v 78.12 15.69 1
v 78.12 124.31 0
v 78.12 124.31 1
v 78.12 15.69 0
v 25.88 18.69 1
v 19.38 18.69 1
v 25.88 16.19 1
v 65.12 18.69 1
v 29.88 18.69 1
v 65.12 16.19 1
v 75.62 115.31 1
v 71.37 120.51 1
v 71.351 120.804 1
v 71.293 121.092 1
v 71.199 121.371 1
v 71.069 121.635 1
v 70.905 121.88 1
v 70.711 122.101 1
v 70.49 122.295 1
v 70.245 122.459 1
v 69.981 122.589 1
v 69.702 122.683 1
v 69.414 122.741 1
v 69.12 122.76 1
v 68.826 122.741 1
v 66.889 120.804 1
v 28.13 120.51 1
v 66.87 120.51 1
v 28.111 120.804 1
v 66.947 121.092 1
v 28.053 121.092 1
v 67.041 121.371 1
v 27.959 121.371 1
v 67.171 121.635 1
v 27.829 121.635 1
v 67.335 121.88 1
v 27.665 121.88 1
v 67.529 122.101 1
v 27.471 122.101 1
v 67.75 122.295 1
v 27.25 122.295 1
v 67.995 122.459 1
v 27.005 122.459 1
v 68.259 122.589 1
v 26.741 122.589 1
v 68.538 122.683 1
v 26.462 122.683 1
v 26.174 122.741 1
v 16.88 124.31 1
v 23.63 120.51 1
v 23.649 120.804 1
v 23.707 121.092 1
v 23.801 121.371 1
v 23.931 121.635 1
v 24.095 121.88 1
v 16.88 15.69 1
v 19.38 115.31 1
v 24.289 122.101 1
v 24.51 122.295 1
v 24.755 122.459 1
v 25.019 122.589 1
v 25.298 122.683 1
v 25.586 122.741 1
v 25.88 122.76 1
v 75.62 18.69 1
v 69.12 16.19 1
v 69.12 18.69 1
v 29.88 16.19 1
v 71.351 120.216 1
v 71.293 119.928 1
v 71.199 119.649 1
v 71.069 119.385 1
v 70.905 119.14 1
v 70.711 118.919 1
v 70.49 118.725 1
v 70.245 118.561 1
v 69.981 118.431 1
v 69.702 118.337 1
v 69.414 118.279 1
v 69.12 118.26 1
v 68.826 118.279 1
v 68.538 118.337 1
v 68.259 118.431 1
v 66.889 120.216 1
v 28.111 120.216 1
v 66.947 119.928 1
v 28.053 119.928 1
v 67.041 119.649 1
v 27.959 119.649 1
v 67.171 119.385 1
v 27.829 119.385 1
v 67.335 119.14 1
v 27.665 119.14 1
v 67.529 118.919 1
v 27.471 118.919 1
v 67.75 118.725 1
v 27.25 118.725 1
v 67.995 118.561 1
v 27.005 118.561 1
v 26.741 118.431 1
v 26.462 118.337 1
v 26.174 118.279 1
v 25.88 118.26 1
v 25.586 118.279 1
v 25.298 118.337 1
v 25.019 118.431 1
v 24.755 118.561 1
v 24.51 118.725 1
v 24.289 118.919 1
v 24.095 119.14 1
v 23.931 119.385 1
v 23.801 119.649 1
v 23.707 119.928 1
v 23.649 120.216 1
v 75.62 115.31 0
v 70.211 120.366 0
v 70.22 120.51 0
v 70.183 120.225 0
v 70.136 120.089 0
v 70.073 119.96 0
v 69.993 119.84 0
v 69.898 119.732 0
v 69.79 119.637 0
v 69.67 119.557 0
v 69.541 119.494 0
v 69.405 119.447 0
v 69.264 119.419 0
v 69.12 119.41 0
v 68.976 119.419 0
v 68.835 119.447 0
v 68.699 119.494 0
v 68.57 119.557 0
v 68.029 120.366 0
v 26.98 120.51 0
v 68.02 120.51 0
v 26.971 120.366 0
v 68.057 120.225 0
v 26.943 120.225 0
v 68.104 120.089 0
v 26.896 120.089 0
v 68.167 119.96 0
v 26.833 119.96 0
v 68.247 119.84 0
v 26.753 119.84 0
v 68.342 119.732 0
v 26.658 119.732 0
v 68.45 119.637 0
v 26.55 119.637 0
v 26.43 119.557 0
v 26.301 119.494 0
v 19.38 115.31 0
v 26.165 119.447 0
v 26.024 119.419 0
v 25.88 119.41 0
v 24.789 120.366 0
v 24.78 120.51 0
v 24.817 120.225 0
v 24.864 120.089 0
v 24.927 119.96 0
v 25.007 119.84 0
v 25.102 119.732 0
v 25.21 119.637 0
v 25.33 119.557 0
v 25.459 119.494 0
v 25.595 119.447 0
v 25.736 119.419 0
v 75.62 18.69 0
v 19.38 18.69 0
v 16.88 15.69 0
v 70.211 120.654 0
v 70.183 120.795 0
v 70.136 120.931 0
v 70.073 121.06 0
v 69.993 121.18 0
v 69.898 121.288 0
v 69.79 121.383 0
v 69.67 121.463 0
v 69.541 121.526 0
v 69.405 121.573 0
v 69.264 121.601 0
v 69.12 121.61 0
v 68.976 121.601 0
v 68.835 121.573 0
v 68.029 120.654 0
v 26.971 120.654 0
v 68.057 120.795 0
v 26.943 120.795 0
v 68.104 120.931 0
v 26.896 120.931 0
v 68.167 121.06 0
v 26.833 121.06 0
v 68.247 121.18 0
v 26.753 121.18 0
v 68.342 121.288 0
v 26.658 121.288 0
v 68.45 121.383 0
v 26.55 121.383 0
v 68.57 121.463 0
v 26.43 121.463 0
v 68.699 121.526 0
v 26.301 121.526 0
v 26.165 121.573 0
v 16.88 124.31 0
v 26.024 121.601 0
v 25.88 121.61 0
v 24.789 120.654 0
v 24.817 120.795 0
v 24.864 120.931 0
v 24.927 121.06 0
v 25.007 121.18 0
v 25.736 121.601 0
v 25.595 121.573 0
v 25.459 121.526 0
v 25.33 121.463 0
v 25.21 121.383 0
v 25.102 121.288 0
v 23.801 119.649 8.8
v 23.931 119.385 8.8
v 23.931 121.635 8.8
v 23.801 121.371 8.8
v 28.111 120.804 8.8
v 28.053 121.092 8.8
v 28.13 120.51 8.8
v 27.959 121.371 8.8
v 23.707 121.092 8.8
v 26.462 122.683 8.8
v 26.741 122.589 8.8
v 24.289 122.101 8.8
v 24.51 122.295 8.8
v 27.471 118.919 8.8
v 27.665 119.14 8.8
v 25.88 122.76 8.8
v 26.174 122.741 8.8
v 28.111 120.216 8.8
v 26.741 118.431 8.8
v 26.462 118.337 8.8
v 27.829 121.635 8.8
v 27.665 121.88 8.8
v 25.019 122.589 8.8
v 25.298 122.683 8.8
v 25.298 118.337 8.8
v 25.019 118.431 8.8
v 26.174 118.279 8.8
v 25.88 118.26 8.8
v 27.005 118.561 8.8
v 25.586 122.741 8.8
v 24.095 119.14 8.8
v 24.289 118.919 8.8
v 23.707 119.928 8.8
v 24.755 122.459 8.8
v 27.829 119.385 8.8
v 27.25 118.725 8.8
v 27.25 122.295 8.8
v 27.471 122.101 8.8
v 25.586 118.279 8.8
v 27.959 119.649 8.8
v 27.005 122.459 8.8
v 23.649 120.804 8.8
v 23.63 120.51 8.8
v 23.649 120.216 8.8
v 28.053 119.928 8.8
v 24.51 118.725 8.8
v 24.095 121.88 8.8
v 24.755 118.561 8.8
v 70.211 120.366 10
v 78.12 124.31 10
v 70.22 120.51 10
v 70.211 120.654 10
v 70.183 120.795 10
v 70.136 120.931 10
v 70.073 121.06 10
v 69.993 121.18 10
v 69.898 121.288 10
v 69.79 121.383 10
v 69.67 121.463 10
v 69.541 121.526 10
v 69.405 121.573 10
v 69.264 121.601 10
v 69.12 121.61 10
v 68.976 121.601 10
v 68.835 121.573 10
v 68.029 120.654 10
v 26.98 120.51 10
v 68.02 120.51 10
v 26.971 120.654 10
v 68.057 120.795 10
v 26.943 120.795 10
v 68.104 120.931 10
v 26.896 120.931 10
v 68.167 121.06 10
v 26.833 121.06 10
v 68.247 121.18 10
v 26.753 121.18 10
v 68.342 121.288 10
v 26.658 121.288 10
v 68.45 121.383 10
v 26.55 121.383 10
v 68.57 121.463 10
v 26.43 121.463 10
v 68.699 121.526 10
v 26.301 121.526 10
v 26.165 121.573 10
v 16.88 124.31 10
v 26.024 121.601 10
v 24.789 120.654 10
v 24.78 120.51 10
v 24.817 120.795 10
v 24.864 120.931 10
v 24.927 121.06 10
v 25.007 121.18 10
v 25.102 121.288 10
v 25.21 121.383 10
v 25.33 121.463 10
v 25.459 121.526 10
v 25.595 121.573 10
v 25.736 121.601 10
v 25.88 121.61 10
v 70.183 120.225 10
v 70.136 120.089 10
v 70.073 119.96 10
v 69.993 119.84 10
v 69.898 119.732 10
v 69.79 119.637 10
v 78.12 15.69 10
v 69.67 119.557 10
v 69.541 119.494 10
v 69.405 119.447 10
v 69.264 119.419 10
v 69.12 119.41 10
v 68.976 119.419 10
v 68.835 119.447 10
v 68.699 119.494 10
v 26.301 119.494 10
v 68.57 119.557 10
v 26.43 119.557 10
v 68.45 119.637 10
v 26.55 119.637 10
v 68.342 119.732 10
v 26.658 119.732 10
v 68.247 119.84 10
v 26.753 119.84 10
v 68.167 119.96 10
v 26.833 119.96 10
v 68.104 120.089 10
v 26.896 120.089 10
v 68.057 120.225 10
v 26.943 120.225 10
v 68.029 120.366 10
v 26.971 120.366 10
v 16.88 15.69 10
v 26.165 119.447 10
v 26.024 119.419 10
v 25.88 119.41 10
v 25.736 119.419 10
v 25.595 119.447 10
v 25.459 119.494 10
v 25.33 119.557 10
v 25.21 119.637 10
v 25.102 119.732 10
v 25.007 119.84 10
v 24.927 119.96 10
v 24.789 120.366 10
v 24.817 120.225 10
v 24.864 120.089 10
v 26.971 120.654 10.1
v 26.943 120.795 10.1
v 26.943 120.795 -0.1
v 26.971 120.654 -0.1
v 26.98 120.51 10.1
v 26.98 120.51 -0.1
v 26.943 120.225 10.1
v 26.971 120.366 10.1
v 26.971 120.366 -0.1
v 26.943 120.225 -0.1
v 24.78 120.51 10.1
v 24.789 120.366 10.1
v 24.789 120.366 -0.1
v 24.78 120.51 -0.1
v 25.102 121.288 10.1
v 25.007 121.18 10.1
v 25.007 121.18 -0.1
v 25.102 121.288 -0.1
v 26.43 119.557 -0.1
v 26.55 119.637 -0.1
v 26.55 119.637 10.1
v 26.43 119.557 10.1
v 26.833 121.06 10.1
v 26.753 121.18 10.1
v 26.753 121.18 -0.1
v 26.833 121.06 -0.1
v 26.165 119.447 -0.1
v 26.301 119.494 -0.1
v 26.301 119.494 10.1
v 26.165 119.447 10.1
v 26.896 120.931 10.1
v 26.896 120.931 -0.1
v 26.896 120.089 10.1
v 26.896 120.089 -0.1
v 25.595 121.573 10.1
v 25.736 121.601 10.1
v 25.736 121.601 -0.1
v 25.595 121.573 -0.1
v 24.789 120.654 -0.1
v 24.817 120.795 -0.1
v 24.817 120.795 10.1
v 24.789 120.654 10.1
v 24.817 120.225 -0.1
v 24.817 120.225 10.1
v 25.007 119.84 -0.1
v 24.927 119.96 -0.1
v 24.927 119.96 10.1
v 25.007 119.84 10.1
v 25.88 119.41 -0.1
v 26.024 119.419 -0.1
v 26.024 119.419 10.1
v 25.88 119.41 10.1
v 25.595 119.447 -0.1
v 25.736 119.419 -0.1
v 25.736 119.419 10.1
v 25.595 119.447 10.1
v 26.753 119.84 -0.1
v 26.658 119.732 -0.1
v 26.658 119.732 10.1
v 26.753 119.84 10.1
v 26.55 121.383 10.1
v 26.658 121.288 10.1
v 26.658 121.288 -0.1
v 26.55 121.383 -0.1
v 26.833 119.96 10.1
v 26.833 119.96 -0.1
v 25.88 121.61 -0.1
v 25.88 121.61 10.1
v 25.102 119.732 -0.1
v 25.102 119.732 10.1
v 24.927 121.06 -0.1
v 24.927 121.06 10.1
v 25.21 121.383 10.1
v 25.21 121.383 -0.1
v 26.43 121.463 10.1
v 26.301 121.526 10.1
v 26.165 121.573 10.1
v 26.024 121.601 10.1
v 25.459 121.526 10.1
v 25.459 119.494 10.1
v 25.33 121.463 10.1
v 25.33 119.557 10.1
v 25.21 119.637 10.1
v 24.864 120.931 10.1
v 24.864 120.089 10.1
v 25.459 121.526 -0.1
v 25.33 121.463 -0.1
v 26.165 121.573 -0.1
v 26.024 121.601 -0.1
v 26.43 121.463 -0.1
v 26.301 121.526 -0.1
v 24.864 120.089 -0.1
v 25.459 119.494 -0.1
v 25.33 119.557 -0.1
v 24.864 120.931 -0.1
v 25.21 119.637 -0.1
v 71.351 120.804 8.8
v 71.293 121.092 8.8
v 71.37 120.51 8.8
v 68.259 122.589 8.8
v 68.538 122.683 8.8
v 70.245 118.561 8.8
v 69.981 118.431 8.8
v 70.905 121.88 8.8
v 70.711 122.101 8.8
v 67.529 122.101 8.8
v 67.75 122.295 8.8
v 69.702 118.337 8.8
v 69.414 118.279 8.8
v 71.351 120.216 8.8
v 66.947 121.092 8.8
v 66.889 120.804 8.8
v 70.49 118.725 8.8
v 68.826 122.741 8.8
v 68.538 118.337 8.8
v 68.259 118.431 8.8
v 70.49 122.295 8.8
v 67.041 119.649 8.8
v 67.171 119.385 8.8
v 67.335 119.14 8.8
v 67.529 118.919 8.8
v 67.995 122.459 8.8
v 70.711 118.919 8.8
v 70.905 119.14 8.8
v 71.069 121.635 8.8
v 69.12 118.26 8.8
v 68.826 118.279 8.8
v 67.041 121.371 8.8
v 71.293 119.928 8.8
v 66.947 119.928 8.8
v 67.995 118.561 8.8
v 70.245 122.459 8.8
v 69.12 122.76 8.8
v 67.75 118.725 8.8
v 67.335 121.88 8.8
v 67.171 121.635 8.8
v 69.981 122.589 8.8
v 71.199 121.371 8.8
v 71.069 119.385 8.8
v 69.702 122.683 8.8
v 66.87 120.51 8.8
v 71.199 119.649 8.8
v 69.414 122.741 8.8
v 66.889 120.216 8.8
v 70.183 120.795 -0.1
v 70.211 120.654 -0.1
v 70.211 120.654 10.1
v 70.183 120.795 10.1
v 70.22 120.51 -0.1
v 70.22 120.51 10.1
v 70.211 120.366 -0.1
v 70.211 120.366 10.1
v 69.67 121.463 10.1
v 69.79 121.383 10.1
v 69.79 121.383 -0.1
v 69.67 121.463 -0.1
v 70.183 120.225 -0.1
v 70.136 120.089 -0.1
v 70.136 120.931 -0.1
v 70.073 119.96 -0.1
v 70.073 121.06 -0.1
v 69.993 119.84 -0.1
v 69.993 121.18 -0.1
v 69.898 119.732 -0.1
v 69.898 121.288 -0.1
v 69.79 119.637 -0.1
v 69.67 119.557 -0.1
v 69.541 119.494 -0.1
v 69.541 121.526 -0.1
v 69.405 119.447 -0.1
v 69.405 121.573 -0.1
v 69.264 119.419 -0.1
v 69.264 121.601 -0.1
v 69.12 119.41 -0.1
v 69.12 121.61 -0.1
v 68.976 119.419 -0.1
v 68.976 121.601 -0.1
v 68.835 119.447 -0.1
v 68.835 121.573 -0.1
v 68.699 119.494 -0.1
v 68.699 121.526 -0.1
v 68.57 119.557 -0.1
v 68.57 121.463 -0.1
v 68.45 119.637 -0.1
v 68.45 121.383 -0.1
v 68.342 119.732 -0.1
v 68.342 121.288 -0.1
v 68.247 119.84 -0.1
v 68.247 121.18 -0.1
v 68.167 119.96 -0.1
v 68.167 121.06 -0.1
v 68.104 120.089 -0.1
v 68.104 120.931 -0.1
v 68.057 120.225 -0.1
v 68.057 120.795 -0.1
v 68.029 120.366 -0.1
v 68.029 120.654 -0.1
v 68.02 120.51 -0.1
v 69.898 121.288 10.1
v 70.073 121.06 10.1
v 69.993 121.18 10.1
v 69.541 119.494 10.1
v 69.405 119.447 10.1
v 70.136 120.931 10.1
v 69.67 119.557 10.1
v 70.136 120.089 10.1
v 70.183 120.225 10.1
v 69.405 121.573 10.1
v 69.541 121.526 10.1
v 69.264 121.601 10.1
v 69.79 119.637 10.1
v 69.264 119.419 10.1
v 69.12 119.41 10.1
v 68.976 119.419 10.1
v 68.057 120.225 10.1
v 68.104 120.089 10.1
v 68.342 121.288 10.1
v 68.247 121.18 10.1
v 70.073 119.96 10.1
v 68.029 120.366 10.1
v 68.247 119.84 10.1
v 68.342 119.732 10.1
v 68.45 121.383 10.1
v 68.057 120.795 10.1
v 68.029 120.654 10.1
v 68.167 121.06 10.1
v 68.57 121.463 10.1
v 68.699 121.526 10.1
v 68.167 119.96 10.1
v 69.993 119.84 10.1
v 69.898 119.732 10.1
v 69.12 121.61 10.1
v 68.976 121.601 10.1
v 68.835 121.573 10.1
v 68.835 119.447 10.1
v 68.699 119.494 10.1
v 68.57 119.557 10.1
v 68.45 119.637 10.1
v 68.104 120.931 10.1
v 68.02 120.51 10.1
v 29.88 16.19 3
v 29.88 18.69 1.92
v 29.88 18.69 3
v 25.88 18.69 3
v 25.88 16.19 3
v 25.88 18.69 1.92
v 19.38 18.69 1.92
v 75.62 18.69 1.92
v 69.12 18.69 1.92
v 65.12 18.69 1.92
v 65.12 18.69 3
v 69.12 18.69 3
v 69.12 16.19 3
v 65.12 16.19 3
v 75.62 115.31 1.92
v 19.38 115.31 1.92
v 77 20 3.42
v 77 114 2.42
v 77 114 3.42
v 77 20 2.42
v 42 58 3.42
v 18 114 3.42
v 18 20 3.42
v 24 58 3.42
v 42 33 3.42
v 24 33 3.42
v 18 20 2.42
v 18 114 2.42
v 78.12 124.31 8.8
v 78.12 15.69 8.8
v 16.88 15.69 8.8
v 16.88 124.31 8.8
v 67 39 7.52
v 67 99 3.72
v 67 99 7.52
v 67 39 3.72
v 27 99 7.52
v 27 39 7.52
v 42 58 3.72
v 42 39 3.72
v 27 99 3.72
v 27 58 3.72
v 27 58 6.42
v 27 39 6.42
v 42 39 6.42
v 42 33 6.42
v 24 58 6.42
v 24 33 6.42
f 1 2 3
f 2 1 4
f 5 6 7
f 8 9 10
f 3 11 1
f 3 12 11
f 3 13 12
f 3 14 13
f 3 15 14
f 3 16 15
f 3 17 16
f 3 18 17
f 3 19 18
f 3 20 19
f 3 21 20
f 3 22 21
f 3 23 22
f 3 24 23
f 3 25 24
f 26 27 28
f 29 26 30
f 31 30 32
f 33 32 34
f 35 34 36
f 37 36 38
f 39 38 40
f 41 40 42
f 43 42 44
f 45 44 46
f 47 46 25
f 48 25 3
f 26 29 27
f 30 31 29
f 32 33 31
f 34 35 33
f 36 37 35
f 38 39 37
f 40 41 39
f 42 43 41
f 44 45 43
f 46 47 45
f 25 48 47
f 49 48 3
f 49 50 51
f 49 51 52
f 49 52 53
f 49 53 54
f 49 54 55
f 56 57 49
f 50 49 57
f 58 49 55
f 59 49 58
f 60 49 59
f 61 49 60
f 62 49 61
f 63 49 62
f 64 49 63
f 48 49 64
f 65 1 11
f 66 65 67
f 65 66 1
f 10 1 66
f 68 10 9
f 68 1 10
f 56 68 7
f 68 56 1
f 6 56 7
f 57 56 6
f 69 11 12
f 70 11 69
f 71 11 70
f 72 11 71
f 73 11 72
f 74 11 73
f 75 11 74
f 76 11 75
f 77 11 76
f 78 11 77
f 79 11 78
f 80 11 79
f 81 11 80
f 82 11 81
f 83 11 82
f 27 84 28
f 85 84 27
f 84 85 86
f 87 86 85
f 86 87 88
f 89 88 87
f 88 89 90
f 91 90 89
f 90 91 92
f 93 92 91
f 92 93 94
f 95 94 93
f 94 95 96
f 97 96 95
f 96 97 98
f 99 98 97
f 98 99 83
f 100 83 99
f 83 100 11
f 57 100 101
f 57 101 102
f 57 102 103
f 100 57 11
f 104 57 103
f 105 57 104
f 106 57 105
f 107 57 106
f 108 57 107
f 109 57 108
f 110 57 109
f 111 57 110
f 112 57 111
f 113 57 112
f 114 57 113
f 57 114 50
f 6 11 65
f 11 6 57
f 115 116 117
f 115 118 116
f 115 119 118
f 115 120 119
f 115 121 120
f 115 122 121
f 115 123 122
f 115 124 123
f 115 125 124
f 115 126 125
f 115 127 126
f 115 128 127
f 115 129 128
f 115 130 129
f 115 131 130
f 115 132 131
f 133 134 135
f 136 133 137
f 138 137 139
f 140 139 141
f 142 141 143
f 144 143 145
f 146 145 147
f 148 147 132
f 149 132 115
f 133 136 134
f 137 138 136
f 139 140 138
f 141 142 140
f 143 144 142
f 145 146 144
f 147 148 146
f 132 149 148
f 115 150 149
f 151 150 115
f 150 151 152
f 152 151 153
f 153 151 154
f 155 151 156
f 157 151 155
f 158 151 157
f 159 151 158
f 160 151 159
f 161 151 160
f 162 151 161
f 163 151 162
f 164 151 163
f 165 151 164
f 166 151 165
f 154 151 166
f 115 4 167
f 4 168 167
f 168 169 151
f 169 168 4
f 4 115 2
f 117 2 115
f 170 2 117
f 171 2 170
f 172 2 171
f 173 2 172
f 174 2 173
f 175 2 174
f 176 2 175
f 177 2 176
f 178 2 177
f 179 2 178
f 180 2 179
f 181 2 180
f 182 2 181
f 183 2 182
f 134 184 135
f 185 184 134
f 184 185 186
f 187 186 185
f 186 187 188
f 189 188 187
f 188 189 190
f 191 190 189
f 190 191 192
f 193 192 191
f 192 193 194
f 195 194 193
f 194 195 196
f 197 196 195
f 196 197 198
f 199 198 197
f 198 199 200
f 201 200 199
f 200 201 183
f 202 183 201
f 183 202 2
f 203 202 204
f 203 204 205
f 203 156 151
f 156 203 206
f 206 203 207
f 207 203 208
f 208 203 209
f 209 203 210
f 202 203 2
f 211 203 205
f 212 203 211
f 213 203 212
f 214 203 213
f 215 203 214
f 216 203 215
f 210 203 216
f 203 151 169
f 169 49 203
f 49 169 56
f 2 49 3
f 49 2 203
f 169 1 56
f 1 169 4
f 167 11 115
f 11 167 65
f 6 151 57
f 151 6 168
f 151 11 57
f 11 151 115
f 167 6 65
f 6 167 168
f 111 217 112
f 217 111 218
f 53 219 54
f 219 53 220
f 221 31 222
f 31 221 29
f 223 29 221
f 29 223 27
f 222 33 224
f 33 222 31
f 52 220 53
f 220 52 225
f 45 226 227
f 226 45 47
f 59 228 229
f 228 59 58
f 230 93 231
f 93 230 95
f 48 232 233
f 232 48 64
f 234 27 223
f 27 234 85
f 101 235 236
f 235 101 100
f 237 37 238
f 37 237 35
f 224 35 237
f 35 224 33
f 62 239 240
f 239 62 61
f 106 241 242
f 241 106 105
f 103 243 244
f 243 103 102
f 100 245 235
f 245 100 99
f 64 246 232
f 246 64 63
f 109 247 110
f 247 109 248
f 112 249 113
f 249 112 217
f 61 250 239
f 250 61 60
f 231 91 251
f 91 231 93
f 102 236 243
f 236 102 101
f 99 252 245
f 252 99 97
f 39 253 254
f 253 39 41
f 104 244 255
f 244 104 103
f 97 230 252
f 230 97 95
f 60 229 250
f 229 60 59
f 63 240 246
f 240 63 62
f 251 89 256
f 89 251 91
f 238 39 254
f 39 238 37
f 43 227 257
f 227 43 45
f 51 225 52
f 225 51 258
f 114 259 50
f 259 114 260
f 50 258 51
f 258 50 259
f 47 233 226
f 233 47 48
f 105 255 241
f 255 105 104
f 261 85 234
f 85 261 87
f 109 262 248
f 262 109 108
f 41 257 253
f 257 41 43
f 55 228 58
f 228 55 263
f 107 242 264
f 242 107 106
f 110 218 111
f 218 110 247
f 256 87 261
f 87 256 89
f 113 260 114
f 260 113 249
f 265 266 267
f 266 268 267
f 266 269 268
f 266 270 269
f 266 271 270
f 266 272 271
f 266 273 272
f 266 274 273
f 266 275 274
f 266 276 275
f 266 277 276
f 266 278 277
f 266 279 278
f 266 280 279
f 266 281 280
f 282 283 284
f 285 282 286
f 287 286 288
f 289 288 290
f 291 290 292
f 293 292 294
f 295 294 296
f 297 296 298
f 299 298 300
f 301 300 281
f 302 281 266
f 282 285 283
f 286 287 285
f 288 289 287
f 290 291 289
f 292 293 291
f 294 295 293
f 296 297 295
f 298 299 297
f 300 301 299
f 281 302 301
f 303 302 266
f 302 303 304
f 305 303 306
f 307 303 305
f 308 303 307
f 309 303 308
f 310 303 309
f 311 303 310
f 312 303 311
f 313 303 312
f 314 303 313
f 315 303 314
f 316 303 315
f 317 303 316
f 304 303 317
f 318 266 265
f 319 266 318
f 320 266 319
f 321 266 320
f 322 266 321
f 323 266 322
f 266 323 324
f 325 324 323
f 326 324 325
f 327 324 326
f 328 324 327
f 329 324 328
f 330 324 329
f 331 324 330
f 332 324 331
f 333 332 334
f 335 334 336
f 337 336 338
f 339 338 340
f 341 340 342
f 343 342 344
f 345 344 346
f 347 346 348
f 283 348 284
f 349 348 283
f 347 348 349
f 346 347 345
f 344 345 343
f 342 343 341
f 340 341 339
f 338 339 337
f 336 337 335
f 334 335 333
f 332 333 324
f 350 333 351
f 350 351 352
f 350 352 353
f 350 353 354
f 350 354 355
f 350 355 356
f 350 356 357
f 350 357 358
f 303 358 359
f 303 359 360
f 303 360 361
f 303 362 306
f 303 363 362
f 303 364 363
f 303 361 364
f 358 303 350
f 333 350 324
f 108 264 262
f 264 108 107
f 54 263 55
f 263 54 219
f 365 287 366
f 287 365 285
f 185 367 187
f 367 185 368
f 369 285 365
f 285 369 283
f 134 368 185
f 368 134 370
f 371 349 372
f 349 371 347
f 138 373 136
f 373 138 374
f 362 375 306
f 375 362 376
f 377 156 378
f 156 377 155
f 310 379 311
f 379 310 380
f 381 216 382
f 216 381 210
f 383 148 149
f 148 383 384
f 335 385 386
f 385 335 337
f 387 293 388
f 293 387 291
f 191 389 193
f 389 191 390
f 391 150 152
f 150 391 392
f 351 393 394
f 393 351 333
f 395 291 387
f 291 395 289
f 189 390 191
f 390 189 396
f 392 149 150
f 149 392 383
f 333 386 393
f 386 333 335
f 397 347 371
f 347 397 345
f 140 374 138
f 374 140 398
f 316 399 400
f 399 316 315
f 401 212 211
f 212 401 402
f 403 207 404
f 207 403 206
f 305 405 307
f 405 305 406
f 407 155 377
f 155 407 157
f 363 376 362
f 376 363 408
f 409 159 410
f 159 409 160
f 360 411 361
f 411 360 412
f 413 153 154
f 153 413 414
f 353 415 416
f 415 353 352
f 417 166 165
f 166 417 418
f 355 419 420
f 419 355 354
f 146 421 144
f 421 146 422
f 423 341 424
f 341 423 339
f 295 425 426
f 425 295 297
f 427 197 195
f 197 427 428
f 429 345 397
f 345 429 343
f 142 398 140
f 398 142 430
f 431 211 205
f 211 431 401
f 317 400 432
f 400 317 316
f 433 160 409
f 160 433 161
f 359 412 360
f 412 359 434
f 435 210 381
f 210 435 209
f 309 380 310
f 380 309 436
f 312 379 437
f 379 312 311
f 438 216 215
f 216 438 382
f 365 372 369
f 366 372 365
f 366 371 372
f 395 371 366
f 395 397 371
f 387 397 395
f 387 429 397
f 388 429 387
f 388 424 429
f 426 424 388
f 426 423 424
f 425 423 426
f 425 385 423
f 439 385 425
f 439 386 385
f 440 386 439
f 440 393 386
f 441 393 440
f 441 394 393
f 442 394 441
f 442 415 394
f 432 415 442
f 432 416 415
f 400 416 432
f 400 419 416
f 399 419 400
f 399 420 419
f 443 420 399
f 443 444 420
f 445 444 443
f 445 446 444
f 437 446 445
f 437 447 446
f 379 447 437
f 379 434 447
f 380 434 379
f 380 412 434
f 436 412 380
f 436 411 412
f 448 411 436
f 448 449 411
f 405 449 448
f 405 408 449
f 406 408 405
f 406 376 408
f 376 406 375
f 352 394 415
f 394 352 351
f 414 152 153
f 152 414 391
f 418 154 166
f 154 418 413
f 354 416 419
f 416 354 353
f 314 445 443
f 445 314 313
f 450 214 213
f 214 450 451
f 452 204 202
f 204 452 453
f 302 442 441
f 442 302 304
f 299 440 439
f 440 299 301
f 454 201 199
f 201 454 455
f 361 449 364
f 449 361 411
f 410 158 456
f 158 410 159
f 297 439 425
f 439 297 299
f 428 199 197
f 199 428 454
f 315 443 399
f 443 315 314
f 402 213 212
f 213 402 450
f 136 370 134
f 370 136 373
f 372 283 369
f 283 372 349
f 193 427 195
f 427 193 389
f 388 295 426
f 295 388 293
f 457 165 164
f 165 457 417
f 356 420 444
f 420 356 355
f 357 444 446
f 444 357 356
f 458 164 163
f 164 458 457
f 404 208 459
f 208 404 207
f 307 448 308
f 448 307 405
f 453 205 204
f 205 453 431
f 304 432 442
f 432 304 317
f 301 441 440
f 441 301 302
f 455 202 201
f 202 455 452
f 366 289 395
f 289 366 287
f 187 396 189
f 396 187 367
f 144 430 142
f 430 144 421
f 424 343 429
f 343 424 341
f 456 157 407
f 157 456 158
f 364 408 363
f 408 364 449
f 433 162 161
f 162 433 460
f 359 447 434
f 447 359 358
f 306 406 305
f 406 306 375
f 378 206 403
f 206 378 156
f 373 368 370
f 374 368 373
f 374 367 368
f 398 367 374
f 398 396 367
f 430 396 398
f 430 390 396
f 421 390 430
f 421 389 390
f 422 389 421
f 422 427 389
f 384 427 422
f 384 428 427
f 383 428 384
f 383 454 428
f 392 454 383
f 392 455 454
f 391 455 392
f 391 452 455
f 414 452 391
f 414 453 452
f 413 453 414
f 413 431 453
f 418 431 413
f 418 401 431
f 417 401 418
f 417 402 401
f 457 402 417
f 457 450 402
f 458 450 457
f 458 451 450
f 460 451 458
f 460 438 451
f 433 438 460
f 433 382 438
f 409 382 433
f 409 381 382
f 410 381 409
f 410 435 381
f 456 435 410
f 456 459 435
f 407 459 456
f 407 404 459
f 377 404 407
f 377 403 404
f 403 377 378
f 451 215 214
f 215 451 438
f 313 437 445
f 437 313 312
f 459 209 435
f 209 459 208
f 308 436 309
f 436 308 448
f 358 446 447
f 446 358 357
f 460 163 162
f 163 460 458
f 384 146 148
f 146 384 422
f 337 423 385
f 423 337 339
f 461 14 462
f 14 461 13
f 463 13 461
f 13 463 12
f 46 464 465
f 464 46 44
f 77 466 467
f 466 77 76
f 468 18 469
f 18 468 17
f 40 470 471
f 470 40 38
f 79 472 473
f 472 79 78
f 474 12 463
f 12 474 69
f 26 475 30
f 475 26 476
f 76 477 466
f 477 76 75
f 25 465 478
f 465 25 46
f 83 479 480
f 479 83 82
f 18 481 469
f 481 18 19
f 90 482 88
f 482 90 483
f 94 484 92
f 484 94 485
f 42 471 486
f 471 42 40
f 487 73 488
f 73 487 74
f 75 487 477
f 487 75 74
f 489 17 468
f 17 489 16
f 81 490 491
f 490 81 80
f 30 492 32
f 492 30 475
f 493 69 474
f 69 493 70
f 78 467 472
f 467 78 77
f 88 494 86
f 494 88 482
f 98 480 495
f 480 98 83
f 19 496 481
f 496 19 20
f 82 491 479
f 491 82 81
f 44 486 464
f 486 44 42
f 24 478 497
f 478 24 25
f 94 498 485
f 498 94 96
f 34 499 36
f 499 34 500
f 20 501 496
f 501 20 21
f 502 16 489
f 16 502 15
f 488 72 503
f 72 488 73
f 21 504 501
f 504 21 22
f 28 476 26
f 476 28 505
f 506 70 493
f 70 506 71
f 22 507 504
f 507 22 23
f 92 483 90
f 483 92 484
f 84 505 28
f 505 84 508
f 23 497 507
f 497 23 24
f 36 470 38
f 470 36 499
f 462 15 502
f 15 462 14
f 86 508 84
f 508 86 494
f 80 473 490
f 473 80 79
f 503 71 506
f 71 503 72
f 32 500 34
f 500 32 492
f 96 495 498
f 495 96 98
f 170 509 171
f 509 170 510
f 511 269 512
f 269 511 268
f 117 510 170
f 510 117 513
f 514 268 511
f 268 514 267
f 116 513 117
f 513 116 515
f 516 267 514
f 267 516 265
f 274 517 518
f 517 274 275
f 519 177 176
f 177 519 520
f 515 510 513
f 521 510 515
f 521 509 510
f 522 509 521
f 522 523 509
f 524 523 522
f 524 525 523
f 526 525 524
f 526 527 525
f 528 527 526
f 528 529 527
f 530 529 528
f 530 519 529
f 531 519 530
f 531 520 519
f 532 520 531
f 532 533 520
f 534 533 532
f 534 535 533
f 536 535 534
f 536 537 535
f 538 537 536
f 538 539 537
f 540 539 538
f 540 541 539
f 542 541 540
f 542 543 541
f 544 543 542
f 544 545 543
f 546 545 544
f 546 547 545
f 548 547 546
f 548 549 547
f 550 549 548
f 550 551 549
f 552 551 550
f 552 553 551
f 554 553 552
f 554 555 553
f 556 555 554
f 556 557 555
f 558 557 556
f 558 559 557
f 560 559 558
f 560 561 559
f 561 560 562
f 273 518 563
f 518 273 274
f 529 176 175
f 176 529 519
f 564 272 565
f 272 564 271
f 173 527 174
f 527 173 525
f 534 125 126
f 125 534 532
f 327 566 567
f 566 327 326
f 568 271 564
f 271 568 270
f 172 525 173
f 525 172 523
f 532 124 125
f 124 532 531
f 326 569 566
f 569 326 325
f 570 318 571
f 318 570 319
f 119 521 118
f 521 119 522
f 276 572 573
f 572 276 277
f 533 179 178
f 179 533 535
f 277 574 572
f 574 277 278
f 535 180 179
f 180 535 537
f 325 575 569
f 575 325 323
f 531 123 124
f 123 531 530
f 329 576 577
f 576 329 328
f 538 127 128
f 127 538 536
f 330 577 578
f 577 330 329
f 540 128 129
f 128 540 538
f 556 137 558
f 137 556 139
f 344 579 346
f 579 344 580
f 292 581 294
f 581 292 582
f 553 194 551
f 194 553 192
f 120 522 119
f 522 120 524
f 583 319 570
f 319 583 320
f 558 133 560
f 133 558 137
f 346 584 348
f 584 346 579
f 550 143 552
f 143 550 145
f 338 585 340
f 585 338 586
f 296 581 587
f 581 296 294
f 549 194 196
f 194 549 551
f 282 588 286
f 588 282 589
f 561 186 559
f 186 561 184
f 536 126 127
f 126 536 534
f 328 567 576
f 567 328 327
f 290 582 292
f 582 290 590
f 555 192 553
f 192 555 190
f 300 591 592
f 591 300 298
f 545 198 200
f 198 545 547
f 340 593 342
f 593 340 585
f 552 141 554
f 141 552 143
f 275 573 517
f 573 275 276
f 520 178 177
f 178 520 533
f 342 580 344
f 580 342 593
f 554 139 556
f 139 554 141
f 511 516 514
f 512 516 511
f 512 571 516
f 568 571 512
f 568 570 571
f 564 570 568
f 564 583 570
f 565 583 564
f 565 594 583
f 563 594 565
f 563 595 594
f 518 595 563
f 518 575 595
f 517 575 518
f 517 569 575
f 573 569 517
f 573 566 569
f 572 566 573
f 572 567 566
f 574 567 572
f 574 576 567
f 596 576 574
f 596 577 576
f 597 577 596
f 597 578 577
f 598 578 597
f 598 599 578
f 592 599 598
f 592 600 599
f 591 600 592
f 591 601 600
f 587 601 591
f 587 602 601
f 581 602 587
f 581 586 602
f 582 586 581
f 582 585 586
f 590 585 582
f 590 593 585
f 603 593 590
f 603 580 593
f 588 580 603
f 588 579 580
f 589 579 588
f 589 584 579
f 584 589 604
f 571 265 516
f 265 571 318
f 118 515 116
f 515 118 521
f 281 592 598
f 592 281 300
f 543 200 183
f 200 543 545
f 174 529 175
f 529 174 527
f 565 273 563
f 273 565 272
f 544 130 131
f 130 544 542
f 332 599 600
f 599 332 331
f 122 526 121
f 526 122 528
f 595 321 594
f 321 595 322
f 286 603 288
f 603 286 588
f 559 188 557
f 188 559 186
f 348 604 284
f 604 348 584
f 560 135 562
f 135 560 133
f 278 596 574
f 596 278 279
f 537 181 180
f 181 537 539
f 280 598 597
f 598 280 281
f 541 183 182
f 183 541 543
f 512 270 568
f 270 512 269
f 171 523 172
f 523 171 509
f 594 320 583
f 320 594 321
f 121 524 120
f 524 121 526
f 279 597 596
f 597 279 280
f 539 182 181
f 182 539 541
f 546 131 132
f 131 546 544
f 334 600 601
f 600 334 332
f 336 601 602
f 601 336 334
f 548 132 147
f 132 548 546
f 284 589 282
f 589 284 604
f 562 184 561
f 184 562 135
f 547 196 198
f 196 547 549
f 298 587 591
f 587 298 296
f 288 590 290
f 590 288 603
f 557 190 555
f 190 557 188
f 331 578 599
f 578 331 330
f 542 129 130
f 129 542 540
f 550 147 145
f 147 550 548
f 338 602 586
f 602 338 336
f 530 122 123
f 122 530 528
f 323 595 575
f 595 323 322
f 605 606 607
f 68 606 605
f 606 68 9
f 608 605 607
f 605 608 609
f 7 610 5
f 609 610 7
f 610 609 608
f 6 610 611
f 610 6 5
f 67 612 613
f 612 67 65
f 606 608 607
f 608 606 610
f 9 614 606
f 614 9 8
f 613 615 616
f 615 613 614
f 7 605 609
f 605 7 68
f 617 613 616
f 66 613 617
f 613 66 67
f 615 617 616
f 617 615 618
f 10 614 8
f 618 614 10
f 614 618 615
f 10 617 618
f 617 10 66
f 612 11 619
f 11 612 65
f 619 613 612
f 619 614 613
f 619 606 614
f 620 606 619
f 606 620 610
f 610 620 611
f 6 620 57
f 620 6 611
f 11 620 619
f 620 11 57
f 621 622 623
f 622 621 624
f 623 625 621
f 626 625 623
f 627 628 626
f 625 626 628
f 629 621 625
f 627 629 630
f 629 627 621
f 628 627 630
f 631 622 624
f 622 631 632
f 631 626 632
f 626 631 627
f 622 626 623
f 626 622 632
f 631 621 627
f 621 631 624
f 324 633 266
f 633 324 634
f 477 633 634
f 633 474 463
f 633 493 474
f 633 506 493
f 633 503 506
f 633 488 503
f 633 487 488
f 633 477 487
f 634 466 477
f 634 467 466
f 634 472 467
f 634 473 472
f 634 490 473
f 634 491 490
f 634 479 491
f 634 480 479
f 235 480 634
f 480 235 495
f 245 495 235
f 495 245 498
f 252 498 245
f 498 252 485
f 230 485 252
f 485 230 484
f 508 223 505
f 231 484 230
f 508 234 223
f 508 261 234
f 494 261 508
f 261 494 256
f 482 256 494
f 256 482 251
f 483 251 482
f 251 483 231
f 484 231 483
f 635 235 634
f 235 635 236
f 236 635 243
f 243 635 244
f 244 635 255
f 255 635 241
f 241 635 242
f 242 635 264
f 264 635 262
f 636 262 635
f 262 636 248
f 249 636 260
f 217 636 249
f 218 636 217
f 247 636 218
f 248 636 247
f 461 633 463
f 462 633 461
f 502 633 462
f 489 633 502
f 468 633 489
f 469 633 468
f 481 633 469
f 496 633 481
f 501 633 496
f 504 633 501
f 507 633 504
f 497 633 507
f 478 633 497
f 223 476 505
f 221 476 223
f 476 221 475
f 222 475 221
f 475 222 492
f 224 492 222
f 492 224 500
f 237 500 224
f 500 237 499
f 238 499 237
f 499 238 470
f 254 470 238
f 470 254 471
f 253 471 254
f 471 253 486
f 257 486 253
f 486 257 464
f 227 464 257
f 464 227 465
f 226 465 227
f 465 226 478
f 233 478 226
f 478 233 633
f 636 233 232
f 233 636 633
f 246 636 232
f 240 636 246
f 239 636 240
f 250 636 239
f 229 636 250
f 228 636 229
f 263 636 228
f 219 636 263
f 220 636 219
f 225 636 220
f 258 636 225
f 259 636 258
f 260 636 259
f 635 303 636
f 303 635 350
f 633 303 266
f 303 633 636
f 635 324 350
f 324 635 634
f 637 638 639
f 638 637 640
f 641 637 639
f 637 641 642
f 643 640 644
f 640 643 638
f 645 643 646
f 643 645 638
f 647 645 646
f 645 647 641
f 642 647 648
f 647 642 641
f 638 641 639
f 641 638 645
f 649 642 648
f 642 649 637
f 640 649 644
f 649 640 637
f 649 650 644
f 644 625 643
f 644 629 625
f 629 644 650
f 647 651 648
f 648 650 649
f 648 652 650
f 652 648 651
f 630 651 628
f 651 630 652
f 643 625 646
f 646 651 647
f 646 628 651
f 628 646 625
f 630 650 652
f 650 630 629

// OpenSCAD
// ENKU R0.1 asymmetric enclosure assembly — preliminary feasibility model
// XY in mm, matching current KiCad origin. Not production CAD.
// Display envelope and PCB are independent; enclosure screws DO NOT traverse display.
// Press F5 to inspect, change 'explode' to 8 for exploded stack.
$fn=48;
explode=0;
pcb=[18,20,59,94]; display=[19.38,18.69,56.24,96.62];
front_z=0; front_t=1.0; display_z=1.0; display_t=0.92;
pcb_z=2.42; pcb_t=1.0; rear_z=8.8; rear_t=1.2;
case_x=17; case_y=16; case_w=61; case_h=102; // asymmetric: 2.69 top, 2.69 bottom in module coordinates; adjust via parameters
// Visible exterior bezel relative to DISPLAY MODULE: top 3 mm, bottom 9 mm.
// These are preliminary exterior dimensions, not clearance-validated:
shell_y=display[1]-3; shell_h=display[3]+3+9;
shell_x=display[0]-2.5; shell_w=display[2]+5;
module slab(x,y,z,w,h,t,c){color(c) translate([x,y,z]) cube([w,h,t]);}
module shell_frame(z,t){
 color([0.20,0.24,0.27,0.4]) translate([shell_x,shell_y,z])
 difference(){
 cube([shell_w,shell_h,t]);
 translate([2.5,3,-0.1]) cube([display[2],display[3],t+0.2]);
 }
}
shell_frame(front_z,front_t);
slab(display[0],display[1],display_z,display[2],display[3],display_t,[0.83,0.82,0.76,0.9]);
slab(pcb[0],pcb[1],pcb_z,pcb[2],pcb[3],pcb_t,[0.08,0.43,0.32,0.65]);
// Rear cover, shown in place; make translucent to see stack
slab(shell_x,shell_y,rear_z+explode,shell_w,shell_h,rear_t,[0.32,0.36,0.40,0.22]);
// Battery envelope, explicitly collision-flagged against U1
slab(27,39,pcb_z+pcb_t+0.3,40,60,3.8,[0.22,0.52,0.8,0.35]);
// U1 module marker: XY collision with candidate battery; NOT solved
slab(24,33,pcb_z+pcb_t,18,25,3,[0.95,0.22,0.18,0.8]);
// Lower two rear screw axes are outside display Y footprint; no PCB-through assumptions
for(x=[shell_x+9,shell_x+shell_w-9]){
 color([0.85,0.65,0.2]) translate([x,shell_y+shell_h-3.8,front_z])
 cylinder(d=4.5,h=rear_z+rear_t);
 color([0.12,0.12,0.12]) translate([x,shell_y+shell_h-3.8,front_z-0.1])
 cylinder(d=2.2,h=rear_z+rear_t+0.2);
}
// Upper hooks: representative blocks, NOT tested flexure/undercut geometry
for(x=[shell_x+9,shell_x+shell_w-13])
 slab(x,shell_y+0.5,front_z+front_t,4,2.5,2.0,[0.9,0.6,0.18]);
echo("Case envelope W/H",shell_w,shell_h);
echo("Top/bottom bezel (display-module exterior)",3,9);
echo("Existing PCB end versus lower screws",pcb[1]+pcb[3],shell_y+shell_h-3.8);
echo("WARNING battery overlaps ESP32 module envelope: placement redesign required");
